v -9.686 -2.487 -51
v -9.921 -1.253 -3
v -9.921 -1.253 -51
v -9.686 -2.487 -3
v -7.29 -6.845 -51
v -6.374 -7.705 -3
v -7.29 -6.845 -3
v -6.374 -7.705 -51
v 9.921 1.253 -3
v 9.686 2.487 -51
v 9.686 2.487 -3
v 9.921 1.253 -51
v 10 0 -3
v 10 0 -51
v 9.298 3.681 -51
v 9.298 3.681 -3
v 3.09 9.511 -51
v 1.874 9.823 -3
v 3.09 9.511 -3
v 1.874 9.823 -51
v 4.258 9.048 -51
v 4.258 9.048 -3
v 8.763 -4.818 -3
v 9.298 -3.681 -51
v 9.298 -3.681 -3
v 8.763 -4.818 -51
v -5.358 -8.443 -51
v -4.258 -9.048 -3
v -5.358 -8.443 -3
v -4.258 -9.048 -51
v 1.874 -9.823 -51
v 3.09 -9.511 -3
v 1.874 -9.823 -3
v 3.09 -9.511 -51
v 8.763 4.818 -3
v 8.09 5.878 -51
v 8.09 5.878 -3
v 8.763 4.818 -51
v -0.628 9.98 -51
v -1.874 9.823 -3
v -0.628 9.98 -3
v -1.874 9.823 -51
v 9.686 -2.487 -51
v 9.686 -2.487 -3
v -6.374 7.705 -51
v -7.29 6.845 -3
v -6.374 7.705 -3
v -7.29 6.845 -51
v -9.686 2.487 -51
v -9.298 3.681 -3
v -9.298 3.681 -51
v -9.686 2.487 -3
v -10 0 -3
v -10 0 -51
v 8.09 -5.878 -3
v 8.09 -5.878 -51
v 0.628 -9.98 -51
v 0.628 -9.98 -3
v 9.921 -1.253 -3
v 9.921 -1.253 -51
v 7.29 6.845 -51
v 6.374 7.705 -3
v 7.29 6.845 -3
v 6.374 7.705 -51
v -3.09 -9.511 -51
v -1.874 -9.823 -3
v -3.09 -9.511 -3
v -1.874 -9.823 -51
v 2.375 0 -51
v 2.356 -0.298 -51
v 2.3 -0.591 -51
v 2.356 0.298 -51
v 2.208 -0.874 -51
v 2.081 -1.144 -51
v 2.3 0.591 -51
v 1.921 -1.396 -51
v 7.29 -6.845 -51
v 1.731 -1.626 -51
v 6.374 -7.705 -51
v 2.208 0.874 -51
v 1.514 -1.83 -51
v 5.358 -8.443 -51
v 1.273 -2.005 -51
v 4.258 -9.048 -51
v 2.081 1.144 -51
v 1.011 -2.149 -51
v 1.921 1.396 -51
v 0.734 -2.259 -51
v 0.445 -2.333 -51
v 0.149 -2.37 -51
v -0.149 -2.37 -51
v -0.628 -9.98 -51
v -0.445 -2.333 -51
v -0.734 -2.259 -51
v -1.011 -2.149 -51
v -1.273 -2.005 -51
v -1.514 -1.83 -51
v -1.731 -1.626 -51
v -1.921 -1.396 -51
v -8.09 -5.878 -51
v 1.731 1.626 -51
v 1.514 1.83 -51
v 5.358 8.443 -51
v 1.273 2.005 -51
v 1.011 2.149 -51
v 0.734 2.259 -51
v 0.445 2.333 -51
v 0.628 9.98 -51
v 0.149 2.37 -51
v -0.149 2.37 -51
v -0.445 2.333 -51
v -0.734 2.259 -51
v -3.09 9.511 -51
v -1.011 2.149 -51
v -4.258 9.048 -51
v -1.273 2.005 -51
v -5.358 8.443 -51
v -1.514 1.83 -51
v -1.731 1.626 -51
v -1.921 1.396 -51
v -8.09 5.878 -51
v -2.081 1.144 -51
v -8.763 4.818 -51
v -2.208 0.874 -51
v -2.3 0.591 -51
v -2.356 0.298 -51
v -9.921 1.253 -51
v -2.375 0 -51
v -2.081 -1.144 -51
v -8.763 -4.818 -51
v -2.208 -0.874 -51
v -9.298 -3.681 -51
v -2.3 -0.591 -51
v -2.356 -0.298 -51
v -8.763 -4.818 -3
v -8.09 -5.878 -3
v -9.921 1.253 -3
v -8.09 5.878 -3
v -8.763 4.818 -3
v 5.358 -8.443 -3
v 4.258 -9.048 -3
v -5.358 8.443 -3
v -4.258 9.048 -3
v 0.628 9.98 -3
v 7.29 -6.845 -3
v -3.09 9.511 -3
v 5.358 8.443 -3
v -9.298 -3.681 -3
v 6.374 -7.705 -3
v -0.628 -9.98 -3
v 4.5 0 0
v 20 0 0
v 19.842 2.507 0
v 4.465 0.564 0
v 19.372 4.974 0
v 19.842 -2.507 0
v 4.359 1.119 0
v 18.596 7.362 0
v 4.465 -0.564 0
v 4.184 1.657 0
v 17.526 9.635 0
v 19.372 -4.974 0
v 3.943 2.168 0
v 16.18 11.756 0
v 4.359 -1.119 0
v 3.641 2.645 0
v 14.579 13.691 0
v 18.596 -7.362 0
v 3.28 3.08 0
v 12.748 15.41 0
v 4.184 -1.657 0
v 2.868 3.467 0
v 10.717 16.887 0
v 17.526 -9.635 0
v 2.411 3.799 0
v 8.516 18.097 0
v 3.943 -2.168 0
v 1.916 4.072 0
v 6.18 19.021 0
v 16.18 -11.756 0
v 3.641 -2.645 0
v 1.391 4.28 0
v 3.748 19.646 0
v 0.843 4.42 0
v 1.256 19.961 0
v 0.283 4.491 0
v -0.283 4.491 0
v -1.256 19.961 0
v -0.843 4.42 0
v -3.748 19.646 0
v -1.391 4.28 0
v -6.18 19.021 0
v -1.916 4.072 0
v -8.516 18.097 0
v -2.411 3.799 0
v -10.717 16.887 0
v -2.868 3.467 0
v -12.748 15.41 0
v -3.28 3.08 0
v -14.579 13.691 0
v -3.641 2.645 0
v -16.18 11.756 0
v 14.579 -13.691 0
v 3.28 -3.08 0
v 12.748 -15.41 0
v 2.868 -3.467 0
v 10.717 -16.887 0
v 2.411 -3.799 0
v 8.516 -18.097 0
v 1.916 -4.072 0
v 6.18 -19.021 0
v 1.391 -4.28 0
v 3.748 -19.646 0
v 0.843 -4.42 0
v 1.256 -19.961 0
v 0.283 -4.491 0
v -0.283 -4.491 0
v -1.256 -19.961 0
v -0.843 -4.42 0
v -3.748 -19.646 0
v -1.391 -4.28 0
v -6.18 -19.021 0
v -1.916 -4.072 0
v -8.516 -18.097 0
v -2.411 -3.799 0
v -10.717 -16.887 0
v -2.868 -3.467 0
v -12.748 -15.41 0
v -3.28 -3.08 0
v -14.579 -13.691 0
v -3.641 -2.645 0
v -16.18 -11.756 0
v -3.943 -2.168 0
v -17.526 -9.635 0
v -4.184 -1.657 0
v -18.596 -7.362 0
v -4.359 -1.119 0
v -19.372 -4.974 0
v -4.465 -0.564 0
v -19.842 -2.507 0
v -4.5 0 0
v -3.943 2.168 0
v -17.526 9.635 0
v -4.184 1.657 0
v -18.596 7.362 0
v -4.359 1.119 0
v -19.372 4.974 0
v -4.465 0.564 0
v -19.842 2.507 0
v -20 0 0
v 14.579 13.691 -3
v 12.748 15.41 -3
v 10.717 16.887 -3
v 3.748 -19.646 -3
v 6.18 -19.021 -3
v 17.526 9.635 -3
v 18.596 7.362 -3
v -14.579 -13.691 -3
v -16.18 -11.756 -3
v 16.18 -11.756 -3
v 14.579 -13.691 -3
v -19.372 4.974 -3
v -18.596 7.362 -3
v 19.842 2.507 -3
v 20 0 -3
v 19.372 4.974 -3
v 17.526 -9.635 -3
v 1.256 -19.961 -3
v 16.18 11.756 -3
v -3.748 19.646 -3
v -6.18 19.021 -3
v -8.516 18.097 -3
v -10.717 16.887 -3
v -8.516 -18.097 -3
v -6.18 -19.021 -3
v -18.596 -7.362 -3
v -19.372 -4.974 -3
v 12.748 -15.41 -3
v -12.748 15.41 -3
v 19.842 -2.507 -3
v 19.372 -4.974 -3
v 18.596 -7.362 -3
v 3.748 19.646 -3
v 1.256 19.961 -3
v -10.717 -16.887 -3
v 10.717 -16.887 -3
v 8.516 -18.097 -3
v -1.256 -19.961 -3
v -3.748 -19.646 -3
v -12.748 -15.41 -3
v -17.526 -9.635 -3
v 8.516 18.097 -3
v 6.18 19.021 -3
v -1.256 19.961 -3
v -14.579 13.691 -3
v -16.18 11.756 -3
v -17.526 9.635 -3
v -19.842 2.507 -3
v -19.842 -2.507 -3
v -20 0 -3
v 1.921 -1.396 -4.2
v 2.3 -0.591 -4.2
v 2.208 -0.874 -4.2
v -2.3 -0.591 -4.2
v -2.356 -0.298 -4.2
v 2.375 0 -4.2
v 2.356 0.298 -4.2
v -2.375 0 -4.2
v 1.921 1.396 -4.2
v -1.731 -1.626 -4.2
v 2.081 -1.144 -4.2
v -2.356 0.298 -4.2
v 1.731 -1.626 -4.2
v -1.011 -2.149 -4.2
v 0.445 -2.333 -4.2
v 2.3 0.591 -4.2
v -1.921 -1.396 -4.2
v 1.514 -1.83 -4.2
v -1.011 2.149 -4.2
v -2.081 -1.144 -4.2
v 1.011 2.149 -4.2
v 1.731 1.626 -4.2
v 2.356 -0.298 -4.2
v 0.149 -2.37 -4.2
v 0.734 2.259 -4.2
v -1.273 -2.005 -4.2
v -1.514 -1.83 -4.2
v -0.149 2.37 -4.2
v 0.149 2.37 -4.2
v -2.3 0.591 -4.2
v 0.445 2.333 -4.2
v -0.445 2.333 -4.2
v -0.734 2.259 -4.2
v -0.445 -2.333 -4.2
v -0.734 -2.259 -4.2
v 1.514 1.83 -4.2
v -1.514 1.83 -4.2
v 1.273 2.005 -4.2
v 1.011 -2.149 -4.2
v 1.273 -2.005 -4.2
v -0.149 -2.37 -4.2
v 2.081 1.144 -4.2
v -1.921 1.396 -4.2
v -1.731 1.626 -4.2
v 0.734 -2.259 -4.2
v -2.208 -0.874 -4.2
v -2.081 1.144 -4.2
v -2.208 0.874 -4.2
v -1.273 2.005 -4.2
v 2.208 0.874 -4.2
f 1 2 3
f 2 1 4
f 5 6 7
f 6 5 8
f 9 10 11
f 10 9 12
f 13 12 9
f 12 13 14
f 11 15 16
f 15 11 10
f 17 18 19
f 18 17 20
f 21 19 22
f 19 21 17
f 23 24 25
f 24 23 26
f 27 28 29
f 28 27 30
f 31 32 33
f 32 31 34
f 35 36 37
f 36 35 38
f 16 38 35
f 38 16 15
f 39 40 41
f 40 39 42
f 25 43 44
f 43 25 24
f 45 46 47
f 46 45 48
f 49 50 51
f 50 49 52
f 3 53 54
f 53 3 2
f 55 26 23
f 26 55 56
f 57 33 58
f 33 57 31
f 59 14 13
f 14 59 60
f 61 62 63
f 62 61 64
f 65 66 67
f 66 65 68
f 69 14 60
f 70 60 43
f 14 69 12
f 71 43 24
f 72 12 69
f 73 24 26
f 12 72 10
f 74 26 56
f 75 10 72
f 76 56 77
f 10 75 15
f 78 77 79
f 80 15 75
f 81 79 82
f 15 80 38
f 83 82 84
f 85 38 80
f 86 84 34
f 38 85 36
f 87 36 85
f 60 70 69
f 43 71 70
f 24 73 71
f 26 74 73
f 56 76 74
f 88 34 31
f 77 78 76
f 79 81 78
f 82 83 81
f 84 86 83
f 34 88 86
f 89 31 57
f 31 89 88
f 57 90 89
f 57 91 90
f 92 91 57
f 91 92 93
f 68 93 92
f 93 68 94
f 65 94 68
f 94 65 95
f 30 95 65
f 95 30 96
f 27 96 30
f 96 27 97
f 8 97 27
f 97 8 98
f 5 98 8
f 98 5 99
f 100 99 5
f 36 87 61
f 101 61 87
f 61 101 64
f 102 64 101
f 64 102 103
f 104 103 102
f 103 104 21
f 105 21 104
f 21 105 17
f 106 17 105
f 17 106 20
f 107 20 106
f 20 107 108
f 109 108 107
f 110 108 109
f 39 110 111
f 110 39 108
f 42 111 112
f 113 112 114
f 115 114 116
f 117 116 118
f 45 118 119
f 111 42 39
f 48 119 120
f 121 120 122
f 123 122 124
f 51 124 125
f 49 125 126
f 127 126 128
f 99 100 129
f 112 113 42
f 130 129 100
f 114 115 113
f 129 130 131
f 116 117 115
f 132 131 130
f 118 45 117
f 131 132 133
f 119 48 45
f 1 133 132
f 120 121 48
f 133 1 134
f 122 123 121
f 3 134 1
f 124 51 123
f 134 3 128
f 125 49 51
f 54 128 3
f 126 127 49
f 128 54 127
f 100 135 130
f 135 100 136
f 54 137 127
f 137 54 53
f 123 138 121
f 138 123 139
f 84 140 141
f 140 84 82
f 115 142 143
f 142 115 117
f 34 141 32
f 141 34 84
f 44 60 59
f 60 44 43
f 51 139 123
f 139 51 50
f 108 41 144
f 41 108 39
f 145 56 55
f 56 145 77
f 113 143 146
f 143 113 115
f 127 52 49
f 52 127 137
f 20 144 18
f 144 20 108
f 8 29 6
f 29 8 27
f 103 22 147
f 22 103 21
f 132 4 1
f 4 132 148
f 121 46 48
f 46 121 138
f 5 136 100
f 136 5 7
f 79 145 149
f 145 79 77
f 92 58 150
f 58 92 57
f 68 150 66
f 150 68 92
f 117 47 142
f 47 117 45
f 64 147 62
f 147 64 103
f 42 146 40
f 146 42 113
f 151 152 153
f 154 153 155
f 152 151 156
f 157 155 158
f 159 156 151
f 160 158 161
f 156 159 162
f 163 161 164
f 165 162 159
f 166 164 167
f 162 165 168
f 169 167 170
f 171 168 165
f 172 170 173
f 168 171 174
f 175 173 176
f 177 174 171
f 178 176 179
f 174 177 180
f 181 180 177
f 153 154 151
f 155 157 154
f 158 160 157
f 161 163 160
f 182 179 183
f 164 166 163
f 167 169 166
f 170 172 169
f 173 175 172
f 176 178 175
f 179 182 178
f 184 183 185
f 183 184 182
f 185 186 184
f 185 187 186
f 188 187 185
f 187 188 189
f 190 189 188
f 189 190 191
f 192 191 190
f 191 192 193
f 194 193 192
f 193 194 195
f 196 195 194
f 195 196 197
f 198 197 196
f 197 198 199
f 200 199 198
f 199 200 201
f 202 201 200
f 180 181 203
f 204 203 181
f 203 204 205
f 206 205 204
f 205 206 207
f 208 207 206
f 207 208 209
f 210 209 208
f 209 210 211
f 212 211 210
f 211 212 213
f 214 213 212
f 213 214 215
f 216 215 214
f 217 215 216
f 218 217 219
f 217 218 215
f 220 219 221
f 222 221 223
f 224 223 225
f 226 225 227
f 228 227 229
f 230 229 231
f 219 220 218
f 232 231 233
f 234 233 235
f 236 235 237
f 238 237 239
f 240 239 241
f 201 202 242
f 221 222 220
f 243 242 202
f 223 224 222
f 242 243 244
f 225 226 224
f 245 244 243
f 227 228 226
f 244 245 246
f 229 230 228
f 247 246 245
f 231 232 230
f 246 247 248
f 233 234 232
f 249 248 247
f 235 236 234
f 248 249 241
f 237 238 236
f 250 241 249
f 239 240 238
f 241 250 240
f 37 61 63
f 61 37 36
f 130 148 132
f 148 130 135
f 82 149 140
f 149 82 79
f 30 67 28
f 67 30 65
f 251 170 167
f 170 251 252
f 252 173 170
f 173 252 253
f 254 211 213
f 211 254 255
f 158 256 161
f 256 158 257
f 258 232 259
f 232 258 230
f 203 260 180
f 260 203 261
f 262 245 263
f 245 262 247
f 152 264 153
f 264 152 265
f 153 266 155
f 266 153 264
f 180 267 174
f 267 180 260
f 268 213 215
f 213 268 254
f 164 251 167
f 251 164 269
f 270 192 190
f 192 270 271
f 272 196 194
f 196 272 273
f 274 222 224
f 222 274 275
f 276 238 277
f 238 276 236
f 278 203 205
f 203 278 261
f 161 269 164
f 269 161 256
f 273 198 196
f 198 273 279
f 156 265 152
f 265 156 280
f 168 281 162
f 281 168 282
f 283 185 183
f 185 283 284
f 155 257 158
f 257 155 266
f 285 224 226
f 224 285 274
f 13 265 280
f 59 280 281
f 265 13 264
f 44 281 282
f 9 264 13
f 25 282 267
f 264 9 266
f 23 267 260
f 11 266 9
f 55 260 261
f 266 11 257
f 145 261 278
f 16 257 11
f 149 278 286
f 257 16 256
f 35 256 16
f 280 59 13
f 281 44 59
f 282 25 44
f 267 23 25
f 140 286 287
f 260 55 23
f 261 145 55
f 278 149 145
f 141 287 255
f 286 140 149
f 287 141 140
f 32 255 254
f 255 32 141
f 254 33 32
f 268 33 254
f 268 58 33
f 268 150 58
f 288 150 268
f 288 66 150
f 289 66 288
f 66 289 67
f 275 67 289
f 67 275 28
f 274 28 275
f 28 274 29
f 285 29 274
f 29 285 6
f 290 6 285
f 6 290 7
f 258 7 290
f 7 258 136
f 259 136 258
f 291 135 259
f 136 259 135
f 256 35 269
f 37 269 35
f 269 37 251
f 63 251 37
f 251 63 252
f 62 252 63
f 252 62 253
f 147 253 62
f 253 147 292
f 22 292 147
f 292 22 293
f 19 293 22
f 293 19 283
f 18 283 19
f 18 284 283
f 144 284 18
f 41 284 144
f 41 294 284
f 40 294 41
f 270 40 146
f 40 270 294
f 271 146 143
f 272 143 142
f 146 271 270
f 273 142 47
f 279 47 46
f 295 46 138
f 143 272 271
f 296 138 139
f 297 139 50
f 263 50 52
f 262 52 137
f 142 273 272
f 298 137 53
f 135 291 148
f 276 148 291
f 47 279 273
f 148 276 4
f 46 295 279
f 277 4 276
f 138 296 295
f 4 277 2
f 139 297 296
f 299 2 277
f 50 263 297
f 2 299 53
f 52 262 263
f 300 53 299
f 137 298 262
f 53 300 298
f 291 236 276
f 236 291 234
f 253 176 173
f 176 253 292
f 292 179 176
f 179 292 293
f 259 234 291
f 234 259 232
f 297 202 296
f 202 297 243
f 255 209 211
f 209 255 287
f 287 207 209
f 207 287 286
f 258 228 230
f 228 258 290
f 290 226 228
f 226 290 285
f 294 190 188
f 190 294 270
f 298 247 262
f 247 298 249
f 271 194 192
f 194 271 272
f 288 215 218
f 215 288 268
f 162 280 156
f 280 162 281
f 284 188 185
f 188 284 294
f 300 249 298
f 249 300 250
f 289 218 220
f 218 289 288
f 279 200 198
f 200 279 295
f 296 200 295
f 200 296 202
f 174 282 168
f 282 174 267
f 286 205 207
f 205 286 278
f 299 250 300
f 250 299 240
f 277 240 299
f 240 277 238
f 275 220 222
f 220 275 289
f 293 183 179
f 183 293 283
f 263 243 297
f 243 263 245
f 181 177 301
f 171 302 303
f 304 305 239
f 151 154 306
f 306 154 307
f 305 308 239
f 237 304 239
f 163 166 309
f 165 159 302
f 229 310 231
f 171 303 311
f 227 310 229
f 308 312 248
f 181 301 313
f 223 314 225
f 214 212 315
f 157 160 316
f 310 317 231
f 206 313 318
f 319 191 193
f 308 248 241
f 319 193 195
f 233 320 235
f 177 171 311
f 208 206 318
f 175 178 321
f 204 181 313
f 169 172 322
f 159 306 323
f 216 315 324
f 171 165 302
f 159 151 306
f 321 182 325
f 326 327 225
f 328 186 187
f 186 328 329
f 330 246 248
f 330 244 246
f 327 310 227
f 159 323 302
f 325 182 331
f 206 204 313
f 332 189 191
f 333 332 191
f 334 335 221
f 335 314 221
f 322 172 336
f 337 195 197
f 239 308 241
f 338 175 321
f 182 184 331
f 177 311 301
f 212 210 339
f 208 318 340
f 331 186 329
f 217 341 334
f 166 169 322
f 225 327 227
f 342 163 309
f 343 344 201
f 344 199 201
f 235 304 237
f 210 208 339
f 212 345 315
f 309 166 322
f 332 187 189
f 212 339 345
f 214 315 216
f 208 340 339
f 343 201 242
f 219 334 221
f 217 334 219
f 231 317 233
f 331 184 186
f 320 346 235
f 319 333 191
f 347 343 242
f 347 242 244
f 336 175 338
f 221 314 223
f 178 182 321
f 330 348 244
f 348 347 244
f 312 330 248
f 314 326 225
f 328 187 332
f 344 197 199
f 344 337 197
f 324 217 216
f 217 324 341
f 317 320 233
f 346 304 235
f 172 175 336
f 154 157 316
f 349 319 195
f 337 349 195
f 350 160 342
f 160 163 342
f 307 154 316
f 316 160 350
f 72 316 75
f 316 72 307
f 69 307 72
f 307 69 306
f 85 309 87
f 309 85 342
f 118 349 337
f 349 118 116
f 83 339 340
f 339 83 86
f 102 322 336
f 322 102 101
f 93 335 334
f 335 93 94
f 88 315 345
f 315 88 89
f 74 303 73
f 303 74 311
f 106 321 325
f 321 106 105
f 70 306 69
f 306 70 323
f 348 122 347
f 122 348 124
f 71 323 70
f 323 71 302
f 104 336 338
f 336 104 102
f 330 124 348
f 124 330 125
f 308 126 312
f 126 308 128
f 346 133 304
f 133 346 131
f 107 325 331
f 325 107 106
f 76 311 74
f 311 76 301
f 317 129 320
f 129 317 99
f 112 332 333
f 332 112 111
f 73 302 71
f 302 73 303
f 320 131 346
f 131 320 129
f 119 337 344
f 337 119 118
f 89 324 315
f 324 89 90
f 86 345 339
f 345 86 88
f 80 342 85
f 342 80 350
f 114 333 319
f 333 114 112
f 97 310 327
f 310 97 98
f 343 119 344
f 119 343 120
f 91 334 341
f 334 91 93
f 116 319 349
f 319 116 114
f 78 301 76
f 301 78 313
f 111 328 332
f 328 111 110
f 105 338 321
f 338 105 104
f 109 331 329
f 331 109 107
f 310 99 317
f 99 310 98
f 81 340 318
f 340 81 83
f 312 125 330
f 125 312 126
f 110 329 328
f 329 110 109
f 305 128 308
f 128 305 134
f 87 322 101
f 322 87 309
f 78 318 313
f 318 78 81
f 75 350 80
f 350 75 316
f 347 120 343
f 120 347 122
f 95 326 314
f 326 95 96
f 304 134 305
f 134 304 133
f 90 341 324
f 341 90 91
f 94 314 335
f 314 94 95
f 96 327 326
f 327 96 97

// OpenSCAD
$fn = 50;


difference() {
	union() {
		translate(v = [0, 0, -51.0000000000]) {
			cylinder(h = 51, r = 10.0000000000);
		}
		translate(v = [0, 0, -3.0000000000]) {
			cylinder(h = 3, r = 20.0000000000);
		}
	}
	union() {
		translate(v = [0, 0, 0]) {
			rotate(a = [0, 0, 0]) {
				difference() {
					union() {
						#translate(v = [0, 0, -51.0000000000]) {
							cylinder(h = 51, r = 2.2500000000);
						}
						#translate(v = [0, 0, -4.2000000000]) {
							cylinder(h = 4.2000000000, r1 = 2.3750000000, r2 = 4.5000000000);
						}
						#translate(v = [0, 0, -51.0000000000]) {
							cylinder(h = 51, r = 2.3750000000);
						}
						#translate(v = [0, 0, -51.0000000000]) {
							cylinder(h = 51, r = 2.2500000000);
						}
					}
					union();
				}
			}
		}
	}
}
